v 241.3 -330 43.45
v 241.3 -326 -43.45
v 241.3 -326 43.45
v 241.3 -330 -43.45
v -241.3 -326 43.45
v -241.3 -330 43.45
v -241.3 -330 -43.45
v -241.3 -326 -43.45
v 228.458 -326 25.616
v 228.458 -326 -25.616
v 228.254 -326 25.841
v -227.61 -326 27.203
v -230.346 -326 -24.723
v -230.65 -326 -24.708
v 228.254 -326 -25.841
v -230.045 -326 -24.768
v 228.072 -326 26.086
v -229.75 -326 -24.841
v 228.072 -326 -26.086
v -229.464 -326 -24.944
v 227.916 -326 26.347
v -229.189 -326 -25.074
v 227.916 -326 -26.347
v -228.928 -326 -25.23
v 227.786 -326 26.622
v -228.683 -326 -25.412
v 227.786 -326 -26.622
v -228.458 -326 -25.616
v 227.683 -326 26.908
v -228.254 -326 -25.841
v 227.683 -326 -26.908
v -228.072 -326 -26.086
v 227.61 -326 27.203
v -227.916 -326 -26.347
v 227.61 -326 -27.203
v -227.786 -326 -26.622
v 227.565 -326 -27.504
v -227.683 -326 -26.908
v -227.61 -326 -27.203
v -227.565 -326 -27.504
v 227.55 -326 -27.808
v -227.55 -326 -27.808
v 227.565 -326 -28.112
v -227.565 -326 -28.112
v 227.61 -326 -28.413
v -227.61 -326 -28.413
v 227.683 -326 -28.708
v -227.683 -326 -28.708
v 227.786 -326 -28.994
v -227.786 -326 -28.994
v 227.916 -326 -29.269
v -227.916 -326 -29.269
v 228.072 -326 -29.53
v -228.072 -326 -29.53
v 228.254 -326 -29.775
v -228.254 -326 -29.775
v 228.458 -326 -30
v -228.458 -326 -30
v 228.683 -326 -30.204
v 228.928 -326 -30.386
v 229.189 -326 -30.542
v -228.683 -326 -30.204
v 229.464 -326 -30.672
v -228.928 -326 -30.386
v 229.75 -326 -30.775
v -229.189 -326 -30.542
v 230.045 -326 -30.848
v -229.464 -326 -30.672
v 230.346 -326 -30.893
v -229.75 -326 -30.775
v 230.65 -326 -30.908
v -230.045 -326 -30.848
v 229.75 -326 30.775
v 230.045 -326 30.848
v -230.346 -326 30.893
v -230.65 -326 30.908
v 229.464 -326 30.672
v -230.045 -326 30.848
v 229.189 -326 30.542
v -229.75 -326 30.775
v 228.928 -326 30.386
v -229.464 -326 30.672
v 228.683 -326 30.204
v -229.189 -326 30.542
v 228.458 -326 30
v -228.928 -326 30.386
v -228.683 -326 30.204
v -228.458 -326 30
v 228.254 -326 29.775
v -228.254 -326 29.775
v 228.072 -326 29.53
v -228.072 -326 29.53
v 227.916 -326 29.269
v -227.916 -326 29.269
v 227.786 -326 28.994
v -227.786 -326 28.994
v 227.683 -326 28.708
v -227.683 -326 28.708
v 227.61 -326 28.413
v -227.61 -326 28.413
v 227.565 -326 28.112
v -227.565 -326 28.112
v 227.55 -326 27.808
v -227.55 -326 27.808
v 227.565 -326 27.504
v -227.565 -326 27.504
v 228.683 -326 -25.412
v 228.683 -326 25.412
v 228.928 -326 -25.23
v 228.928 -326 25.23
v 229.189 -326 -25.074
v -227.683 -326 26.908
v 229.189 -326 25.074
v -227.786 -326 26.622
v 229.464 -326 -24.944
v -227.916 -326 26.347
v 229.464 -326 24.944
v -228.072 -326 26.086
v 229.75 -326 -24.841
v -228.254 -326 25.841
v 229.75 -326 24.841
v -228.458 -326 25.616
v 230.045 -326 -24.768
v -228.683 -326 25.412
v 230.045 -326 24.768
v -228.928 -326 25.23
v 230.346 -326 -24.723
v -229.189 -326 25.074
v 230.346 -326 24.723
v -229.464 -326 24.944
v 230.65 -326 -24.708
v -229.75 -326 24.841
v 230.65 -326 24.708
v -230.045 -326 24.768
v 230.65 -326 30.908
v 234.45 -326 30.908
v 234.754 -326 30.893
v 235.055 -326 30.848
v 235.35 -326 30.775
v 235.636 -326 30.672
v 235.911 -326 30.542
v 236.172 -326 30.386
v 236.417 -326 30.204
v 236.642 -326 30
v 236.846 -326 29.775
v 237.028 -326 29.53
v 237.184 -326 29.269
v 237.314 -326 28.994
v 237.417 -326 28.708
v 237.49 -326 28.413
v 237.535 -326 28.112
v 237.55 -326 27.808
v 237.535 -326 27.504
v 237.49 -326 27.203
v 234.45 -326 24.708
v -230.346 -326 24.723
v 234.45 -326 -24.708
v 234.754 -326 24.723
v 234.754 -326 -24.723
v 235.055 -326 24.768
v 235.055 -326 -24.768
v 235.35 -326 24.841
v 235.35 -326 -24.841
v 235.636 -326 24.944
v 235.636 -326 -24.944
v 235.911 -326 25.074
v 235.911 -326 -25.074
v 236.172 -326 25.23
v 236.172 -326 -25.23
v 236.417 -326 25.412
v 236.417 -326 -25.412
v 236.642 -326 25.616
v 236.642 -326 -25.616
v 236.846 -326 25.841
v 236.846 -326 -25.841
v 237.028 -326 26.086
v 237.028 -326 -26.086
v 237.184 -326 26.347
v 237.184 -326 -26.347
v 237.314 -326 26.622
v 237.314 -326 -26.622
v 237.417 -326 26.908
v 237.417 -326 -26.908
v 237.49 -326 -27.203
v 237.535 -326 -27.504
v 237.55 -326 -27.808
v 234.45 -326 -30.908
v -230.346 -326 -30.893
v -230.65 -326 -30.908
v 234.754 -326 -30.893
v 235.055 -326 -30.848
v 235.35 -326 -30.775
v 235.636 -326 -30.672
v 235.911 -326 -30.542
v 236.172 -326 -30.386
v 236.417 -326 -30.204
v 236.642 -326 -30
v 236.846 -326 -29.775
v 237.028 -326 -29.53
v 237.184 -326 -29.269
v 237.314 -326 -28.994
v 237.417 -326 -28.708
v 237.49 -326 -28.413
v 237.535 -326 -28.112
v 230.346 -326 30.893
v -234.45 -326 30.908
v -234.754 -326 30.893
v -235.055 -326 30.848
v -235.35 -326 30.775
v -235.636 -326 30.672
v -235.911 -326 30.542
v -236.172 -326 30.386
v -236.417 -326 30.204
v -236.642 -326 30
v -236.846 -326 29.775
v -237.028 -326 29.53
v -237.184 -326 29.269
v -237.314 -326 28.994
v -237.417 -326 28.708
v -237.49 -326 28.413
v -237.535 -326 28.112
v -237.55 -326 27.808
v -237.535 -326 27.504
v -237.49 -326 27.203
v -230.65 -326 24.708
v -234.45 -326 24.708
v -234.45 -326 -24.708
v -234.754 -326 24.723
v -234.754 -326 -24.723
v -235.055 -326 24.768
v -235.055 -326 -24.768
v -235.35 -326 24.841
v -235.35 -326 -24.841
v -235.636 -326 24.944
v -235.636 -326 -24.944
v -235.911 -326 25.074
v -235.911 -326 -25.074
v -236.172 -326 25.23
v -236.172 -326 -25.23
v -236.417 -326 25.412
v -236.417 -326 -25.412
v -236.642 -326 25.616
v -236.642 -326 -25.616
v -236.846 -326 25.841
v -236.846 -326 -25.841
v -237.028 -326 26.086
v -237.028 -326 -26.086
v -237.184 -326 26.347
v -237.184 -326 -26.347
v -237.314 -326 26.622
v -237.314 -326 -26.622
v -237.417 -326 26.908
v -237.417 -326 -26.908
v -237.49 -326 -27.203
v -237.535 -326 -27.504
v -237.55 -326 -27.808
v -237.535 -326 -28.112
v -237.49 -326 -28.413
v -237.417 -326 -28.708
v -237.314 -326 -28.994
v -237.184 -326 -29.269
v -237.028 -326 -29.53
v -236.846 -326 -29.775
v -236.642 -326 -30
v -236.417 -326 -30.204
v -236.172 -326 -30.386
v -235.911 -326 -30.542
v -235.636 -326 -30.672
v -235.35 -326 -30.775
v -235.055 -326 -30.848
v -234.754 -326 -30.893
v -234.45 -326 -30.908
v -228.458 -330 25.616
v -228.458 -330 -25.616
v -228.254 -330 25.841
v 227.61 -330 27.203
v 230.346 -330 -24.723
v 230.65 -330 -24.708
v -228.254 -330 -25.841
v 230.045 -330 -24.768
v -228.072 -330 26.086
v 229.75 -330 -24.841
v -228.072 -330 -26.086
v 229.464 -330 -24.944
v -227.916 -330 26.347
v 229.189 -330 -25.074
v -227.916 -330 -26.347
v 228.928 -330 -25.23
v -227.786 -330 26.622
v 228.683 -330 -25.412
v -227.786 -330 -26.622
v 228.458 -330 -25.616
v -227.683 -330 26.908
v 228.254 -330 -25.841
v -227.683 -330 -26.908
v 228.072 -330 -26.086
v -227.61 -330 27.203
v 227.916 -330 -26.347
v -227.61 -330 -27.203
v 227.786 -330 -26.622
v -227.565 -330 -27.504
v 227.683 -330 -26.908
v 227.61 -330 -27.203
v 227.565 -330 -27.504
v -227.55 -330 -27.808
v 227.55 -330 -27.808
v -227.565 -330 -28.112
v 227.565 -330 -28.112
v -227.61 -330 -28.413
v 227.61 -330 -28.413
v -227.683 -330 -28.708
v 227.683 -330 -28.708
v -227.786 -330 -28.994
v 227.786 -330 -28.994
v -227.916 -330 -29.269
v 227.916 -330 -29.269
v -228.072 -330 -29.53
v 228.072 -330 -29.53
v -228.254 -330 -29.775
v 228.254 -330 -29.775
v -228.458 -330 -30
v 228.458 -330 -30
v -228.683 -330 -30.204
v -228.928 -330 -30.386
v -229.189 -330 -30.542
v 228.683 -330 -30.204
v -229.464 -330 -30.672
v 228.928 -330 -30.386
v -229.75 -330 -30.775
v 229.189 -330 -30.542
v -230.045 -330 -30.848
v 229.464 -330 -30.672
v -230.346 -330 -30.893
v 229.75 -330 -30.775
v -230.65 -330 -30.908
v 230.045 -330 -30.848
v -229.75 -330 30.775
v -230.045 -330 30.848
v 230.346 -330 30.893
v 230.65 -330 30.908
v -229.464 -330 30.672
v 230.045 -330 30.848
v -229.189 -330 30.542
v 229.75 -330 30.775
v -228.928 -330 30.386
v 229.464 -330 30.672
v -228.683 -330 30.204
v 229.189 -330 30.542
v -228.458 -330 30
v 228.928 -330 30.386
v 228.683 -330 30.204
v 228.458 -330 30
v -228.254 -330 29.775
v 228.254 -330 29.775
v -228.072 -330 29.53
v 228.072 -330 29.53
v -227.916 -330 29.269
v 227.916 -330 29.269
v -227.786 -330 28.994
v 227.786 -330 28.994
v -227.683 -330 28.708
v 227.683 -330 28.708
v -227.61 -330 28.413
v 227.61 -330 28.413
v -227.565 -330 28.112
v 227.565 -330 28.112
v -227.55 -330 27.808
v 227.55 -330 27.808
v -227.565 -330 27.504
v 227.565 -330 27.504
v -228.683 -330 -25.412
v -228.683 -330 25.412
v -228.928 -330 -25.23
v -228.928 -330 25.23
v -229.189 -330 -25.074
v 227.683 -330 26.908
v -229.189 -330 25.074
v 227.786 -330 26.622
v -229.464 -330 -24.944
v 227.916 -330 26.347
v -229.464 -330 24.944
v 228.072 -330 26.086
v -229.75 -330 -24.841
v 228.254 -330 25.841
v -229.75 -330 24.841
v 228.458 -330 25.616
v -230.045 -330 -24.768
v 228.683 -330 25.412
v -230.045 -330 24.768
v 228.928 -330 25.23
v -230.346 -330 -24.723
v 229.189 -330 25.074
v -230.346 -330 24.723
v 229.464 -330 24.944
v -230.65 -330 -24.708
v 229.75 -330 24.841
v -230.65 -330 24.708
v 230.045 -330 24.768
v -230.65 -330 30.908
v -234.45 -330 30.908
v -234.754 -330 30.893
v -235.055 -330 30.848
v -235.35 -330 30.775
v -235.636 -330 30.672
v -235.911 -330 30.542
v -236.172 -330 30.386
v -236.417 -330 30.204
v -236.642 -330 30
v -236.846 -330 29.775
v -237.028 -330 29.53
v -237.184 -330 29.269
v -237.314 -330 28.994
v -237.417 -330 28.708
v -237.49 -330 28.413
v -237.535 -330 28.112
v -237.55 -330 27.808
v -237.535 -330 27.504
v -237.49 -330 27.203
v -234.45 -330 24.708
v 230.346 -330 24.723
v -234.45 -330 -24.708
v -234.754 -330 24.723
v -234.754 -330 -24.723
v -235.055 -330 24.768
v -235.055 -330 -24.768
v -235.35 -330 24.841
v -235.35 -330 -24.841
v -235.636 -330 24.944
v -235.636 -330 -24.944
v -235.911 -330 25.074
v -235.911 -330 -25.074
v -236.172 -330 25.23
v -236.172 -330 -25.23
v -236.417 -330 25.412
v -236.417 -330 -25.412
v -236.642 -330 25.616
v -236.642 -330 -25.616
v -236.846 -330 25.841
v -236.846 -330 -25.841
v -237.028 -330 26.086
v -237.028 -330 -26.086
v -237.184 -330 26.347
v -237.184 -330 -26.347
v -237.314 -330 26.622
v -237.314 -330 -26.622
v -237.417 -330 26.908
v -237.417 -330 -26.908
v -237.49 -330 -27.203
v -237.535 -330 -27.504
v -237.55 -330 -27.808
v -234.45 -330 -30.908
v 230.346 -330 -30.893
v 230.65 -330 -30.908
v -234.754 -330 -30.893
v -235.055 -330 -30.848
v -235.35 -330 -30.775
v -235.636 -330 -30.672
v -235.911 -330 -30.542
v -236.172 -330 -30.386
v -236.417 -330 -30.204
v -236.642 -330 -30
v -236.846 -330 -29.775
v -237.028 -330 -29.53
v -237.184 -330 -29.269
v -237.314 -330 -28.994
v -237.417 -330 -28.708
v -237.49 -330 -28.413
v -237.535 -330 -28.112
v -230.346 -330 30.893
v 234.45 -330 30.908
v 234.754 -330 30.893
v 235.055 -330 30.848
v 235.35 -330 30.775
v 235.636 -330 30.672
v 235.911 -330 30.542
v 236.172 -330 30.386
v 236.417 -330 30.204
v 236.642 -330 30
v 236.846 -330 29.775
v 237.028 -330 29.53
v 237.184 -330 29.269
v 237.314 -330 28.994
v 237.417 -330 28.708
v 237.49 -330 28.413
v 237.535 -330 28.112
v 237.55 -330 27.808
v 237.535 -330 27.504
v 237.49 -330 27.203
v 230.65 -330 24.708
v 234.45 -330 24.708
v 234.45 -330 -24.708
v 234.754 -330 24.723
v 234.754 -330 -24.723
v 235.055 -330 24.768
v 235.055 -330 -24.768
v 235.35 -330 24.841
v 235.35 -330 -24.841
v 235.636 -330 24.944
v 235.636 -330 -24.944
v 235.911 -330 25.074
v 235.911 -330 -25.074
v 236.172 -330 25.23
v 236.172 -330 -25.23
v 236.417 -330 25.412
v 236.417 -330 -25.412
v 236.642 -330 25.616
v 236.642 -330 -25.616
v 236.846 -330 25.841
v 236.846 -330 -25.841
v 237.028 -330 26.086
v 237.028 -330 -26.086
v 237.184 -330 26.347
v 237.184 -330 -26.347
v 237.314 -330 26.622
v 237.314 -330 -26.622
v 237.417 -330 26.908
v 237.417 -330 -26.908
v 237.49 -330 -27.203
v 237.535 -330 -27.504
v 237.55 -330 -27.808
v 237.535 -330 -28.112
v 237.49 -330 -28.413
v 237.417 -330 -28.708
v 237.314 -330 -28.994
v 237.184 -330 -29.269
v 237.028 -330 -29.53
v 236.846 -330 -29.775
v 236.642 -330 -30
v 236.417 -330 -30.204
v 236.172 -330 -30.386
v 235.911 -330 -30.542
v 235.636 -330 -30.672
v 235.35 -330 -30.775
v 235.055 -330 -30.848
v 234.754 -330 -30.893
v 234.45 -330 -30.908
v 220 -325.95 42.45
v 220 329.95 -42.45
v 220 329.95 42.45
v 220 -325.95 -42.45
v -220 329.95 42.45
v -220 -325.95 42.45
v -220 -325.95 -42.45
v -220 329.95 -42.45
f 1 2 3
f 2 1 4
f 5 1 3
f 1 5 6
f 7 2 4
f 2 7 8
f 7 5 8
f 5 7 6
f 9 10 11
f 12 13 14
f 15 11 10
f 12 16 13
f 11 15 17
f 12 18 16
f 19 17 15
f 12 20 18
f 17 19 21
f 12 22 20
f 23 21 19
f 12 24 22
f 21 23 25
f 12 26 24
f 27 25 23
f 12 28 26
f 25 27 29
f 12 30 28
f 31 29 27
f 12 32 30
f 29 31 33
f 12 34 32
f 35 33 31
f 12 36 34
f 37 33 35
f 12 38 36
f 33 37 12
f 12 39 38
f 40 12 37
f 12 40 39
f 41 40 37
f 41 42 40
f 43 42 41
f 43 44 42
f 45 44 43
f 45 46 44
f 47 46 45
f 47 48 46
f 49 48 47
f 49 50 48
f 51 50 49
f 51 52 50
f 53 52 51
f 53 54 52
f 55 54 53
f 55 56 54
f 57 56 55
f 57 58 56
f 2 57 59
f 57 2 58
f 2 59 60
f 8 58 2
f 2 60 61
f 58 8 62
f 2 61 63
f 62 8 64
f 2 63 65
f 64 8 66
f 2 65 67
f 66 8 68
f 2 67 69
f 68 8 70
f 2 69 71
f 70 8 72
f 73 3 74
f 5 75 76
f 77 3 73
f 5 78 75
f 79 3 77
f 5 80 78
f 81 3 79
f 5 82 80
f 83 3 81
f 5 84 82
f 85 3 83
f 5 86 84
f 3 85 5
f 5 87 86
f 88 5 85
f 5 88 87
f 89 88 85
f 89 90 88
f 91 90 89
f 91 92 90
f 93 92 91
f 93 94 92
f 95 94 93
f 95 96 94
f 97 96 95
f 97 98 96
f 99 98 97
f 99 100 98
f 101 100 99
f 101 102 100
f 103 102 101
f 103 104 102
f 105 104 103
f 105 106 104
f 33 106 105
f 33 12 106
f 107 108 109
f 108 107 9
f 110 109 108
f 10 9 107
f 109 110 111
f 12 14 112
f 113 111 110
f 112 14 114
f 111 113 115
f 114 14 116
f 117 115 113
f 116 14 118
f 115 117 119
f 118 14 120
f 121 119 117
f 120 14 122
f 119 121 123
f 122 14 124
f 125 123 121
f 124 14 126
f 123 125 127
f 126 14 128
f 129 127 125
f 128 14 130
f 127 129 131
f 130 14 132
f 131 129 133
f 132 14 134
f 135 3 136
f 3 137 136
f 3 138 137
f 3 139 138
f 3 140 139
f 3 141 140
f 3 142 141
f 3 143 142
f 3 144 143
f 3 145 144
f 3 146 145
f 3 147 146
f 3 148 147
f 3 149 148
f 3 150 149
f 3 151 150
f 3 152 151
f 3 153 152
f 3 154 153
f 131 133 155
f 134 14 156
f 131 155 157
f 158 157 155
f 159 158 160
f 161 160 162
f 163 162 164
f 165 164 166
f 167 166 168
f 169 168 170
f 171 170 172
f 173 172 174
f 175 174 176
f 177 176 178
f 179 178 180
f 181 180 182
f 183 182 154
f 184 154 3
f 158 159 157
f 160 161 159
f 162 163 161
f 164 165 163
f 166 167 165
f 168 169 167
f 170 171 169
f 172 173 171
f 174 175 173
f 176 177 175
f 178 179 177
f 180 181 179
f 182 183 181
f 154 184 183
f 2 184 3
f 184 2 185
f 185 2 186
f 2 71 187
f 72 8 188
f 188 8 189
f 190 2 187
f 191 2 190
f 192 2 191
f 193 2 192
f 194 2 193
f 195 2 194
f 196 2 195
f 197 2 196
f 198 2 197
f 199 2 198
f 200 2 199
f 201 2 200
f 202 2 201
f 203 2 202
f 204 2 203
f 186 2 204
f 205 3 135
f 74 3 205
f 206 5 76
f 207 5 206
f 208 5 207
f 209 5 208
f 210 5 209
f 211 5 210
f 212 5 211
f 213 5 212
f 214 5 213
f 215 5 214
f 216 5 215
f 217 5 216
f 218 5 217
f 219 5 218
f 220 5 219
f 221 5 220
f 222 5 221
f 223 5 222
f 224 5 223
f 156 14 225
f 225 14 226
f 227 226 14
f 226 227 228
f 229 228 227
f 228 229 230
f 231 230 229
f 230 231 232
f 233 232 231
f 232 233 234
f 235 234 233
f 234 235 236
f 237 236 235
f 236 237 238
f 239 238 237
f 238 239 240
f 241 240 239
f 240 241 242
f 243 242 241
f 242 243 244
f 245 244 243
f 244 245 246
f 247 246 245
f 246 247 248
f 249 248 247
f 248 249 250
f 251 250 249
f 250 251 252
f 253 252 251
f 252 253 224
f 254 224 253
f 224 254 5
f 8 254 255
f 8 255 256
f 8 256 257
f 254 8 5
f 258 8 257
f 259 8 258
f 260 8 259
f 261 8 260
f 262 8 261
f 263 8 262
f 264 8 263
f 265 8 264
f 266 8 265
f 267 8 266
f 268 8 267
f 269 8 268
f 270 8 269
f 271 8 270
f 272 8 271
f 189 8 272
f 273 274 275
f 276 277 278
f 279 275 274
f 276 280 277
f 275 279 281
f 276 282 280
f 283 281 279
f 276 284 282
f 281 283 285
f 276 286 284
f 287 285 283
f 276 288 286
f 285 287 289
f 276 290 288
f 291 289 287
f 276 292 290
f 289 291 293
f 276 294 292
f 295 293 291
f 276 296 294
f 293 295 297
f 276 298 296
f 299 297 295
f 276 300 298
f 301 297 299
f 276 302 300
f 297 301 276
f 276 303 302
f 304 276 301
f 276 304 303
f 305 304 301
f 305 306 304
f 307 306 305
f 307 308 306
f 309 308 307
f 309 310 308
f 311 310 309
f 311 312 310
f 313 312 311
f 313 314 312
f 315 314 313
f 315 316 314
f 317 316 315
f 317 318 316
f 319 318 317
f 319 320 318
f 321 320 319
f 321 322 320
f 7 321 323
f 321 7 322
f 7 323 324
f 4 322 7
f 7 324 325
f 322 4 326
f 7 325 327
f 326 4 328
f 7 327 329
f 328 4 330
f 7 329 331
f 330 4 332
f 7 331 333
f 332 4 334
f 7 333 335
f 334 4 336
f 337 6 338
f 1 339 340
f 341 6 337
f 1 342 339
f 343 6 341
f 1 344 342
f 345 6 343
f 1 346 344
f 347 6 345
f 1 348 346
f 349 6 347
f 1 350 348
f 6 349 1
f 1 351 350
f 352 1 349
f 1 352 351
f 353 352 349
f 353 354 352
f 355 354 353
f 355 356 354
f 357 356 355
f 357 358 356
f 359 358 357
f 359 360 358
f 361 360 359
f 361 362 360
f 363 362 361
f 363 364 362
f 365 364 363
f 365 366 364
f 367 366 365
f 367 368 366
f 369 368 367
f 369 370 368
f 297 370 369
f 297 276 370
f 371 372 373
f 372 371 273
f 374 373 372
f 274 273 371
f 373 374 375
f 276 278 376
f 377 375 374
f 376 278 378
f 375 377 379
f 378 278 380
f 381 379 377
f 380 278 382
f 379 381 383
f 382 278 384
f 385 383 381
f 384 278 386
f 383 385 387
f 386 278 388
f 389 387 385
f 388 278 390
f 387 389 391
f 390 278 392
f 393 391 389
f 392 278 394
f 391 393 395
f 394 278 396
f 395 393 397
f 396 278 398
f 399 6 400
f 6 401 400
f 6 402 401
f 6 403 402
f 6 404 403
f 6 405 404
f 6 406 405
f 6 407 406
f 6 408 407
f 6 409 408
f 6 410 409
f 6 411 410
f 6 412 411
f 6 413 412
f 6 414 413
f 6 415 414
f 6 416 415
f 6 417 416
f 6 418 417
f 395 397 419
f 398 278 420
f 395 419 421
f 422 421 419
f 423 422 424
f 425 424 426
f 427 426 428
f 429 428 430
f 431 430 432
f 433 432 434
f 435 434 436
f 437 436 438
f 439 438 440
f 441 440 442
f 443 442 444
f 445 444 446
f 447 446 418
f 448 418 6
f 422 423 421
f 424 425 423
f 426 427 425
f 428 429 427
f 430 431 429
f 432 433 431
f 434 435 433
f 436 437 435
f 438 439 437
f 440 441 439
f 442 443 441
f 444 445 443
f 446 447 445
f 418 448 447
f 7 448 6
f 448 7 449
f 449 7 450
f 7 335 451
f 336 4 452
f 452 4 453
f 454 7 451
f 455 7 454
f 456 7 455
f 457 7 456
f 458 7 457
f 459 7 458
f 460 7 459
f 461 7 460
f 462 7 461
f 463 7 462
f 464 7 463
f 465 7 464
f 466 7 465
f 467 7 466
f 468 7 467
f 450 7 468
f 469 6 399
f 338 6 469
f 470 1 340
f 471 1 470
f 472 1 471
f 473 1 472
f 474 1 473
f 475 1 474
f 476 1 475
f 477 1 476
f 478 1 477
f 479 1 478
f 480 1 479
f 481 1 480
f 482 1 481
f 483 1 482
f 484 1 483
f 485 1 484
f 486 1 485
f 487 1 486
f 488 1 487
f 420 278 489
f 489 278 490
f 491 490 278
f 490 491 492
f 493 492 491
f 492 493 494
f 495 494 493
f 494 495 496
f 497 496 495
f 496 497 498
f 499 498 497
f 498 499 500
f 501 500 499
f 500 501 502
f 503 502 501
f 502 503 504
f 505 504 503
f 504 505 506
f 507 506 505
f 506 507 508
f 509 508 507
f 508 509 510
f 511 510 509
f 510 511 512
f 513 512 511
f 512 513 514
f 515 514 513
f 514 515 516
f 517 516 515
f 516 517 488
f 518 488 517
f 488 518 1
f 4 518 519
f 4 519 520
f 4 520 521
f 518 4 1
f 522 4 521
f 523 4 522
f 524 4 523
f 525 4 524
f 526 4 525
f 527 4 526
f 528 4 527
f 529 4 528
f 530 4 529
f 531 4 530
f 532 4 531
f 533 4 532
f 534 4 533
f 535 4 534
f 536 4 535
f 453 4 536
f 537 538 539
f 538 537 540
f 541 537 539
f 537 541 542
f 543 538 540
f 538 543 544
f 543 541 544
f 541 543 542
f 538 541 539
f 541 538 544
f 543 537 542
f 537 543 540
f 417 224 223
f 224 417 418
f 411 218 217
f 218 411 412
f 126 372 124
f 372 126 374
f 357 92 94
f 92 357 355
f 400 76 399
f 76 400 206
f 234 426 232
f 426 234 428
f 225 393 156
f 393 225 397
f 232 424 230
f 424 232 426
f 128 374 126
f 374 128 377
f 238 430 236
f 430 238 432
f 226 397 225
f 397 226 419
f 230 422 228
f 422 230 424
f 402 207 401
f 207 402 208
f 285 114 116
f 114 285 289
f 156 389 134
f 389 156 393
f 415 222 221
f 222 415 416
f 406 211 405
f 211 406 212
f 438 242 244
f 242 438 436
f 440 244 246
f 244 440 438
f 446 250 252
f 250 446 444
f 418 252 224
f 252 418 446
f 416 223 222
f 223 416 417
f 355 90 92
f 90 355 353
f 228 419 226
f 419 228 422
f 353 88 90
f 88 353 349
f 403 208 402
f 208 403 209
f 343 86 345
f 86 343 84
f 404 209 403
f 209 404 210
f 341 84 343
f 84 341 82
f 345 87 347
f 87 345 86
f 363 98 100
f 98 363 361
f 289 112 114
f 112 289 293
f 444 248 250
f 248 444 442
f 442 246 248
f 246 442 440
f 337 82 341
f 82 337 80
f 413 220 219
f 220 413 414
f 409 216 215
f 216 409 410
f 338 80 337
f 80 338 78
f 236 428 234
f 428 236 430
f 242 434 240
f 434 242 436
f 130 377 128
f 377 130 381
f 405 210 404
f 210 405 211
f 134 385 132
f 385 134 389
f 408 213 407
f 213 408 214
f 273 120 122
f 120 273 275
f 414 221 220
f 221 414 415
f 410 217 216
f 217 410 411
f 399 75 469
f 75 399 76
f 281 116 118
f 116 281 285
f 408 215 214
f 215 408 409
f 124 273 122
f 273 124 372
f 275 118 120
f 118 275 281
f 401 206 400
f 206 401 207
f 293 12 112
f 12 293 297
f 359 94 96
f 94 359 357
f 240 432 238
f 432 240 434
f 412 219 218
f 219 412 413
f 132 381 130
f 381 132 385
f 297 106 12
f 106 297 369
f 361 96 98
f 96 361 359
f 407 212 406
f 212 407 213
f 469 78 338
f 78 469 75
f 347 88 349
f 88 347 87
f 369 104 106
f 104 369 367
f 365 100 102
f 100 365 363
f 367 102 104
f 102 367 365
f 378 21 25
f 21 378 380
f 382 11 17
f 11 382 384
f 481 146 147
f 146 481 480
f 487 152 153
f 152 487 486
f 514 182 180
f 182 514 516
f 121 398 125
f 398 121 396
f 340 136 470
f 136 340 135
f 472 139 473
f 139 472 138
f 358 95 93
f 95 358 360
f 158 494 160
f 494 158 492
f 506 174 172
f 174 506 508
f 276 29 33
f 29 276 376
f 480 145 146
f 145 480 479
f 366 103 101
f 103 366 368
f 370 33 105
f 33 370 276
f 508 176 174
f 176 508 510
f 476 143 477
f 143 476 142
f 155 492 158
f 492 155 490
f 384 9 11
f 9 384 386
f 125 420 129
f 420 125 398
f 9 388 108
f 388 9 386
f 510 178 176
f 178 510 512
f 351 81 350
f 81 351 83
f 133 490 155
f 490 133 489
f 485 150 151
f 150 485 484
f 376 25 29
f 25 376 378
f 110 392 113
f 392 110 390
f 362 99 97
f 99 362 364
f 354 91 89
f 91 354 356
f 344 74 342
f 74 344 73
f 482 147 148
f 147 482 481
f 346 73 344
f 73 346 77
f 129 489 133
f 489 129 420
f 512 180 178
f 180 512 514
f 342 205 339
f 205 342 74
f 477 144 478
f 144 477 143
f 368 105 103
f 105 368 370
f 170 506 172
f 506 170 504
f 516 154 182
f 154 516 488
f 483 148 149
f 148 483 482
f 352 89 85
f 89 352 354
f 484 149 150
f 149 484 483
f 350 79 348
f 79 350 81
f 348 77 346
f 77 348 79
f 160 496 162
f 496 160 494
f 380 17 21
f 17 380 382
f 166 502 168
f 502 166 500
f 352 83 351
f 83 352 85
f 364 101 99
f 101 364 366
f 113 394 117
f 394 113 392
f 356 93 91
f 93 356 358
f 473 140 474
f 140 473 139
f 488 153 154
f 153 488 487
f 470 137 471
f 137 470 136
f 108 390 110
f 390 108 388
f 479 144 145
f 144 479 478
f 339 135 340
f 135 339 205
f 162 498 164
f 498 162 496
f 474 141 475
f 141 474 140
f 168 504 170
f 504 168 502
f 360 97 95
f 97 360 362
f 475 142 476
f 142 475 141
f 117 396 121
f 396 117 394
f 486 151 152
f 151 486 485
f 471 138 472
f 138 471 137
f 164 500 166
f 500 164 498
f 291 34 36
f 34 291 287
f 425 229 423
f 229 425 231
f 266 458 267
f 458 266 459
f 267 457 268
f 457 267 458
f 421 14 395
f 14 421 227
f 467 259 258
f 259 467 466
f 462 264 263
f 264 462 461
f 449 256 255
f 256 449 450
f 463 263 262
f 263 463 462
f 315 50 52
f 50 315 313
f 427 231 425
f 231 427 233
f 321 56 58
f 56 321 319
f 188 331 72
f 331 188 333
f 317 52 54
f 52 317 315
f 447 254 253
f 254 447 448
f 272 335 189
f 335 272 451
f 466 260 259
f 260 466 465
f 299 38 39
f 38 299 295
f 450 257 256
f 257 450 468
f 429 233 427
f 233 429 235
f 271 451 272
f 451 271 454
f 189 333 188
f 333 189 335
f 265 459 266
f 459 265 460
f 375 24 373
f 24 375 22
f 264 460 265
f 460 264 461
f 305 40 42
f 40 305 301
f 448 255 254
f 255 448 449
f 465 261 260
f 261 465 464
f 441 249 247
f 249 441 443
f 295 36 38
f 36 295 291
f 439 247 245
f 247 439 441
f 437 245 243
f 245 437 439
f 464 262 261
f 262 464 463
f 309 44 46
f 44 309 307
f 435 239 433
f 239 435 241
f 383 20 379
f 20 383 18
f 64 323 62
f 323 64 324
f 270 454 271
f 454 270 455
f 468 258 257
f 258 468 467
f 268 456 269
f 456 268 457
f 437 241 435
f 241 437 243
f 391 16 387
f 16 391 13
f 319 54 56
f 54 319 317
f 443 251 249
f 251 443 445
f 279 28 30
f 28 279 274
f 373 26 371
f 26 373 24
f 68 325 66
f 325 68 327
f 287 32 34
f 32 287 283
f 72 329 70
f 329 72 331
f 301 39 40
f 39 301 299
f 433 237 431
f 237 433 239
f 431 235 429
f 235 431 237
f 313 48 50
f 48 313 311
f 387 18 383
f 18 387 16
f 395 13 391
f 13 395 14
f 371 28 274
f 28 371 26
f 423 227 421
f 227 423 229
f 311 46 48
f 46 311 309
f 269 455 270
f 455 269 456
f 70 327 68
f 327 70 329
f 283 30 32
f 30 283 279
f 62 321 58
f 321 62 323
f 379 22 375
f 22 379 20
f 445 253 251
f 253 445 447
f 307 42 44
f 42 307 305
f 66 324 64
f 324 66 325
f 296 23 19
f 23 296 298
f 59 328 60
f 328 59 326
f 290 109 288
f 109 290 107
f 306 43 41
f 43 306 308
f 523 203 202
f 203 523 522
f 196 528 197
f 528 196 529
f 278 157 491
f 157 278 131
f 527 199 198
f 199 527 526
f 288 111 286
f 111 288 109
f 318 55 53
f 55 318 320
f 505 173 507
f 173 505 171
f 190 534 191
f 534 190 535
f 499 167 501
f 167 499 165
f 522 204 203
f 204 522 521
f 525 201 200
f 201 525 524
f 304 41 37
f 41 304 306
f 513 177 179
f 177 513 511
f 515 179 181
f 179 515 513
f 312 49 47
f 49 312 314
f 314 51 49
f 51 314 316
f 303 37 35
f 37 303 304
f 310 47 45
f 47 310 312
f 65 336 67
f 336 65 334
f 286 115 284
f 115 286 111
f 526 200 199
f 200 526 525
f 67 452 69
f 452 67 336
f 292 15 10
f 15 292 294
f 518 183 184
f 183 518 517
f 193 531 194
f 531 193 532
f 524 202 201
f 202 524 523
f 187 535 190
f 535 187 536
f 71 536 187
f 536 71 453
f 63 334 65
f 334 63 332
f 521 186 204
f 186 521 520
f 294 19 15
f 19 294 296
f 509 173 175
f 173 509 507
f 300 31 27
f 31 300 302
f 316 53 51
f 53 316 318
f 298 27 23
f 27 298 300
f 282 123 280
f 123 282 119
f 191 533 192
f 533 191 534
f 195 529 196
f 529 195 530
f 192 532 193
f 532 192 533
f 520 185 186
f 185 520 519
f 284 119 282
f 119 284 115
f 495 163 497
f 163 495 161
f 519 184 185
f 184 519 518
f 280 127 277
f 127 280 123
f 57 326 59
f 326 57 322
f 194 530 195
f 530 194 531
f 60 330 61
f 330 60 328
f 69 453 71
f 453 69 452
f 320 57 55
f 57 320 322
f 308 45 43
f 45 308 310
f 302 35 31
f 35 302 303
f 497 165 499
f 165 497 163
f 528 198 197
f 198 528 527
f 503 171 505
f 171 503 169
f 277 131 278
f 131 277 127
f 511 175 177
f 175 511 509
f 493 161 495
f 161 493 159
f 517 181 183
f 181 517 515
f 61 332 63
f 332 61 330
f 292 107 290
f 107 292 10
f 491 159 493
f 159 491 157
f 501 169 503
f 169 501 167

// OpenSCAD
// ============================================================================
// Atom Lithography Machine — Parametric OpenSCAD Module (S7.1-03)
// ============================================================================
// part_id           : S7.1-03
// parent_bom_id     : S7.1
// subsystem         : S7
// part_name         : Cift-donusumlu kesintisiz guc kaynagi (UPS 6 kVA) ve akilli PDU
// material          : Steel
// temp_stage        : 300 K (kabin)
// vacuum_grade      : Atmosfer
// tolerance         : ±1% gerilim
// computed_mass_kg  : 46.00000
// envelope_mm       : 482.600 x 698.400 x 131.350
// design_maturity   : M0_M1_DETAILED_CAD_DESIGN_ONLY
// no_lab_measurement: true
// iec61508_certified: false
// semi_s2_certified : false
// Units: millimeters (mm)
// ============================================================================

$fn = 64;

// Nominal bounding envelope parameters (mm)
bbox_x = 482.6000;
bbox_y = 698.4000;
bbox_z = 131.3500;

// Part-specific parametric dimensions
rack_bay = 1;
u_start = 1;
u_count = 3;
depth_mm = 660.0;

// Interface / port parameters (mm)

module part_S7_1_03() {
  difference() {
    union() {
      // 19-inch EIA-310 front faceplate
      translate([0.000, -328.000, 0.000]) cube([482.600, 4.000, 86.900], center=true);
      // Main rack chassis enclosure
      translate([0.000, 2.000, 0.000]) cube([440.000, 655.900, 84.900], center=true);
    }
    // EIA-310 rack ear mounting slot (top-left)
    translate([-232.550, -328.000, 27.808]) rotate([90.000, 0.000, 0.000]) {
      hull() {
        translate([-1.900, 0, 0]) cylinder(d=6.200, h=8.000, center=true);
        translate([1.900, 0, 0]) cylinder(d=6.200, h=8.000, center=true);
      }
    }
    // EIA-310 rack ear mounting slot (top-right)
    translate([232.550, -328.000, 27.808]) rotate([90.000, 0.000, 0.000]) {
      hull() {
        translate([-1.900, 0, 0]) cylinder(d=6.200, h=8.000, center=true);
        translate([1.900, 0, 0]) cylinder(d=6.200, h=8.000, center=true);
      }
    }
    // EIA-310 rack ear mounting slot (bottom-left)
    translate([-232.550, -328.000, -27.808]) rotate([90.000, 0.000, 0.000]) {
      hull() {
        translate([-1.900, 0, 0]) cylinder(d=6.200, h=8.000, center=true);
        translate([1.900, 0, 0]) cylinder(d=6.200, h=8.000, center=true);
      }
    }
    // EIA-310 rack ear mounting slot (bottom-right)
    translate([232.550, -328.000, -27.808]) rotate([90.000, 0.000, 0.000]) {
      hull() {
        translate([-1.900, 0, 0]) cylinder(d=6.200, h=8.000, center=true);
        translate([1.900, 0, 0]) cylinder(d=6.200, h=8.000, center=true);
      }
    }
  }
}

// World assembly mounting transform (global machine frame, mm / deg):
// translate([1480.000, -108.000, 167.787]) rotate([0.000, 0.000, 0.000]) part_S7_1_03();

part_S7_1_03();
